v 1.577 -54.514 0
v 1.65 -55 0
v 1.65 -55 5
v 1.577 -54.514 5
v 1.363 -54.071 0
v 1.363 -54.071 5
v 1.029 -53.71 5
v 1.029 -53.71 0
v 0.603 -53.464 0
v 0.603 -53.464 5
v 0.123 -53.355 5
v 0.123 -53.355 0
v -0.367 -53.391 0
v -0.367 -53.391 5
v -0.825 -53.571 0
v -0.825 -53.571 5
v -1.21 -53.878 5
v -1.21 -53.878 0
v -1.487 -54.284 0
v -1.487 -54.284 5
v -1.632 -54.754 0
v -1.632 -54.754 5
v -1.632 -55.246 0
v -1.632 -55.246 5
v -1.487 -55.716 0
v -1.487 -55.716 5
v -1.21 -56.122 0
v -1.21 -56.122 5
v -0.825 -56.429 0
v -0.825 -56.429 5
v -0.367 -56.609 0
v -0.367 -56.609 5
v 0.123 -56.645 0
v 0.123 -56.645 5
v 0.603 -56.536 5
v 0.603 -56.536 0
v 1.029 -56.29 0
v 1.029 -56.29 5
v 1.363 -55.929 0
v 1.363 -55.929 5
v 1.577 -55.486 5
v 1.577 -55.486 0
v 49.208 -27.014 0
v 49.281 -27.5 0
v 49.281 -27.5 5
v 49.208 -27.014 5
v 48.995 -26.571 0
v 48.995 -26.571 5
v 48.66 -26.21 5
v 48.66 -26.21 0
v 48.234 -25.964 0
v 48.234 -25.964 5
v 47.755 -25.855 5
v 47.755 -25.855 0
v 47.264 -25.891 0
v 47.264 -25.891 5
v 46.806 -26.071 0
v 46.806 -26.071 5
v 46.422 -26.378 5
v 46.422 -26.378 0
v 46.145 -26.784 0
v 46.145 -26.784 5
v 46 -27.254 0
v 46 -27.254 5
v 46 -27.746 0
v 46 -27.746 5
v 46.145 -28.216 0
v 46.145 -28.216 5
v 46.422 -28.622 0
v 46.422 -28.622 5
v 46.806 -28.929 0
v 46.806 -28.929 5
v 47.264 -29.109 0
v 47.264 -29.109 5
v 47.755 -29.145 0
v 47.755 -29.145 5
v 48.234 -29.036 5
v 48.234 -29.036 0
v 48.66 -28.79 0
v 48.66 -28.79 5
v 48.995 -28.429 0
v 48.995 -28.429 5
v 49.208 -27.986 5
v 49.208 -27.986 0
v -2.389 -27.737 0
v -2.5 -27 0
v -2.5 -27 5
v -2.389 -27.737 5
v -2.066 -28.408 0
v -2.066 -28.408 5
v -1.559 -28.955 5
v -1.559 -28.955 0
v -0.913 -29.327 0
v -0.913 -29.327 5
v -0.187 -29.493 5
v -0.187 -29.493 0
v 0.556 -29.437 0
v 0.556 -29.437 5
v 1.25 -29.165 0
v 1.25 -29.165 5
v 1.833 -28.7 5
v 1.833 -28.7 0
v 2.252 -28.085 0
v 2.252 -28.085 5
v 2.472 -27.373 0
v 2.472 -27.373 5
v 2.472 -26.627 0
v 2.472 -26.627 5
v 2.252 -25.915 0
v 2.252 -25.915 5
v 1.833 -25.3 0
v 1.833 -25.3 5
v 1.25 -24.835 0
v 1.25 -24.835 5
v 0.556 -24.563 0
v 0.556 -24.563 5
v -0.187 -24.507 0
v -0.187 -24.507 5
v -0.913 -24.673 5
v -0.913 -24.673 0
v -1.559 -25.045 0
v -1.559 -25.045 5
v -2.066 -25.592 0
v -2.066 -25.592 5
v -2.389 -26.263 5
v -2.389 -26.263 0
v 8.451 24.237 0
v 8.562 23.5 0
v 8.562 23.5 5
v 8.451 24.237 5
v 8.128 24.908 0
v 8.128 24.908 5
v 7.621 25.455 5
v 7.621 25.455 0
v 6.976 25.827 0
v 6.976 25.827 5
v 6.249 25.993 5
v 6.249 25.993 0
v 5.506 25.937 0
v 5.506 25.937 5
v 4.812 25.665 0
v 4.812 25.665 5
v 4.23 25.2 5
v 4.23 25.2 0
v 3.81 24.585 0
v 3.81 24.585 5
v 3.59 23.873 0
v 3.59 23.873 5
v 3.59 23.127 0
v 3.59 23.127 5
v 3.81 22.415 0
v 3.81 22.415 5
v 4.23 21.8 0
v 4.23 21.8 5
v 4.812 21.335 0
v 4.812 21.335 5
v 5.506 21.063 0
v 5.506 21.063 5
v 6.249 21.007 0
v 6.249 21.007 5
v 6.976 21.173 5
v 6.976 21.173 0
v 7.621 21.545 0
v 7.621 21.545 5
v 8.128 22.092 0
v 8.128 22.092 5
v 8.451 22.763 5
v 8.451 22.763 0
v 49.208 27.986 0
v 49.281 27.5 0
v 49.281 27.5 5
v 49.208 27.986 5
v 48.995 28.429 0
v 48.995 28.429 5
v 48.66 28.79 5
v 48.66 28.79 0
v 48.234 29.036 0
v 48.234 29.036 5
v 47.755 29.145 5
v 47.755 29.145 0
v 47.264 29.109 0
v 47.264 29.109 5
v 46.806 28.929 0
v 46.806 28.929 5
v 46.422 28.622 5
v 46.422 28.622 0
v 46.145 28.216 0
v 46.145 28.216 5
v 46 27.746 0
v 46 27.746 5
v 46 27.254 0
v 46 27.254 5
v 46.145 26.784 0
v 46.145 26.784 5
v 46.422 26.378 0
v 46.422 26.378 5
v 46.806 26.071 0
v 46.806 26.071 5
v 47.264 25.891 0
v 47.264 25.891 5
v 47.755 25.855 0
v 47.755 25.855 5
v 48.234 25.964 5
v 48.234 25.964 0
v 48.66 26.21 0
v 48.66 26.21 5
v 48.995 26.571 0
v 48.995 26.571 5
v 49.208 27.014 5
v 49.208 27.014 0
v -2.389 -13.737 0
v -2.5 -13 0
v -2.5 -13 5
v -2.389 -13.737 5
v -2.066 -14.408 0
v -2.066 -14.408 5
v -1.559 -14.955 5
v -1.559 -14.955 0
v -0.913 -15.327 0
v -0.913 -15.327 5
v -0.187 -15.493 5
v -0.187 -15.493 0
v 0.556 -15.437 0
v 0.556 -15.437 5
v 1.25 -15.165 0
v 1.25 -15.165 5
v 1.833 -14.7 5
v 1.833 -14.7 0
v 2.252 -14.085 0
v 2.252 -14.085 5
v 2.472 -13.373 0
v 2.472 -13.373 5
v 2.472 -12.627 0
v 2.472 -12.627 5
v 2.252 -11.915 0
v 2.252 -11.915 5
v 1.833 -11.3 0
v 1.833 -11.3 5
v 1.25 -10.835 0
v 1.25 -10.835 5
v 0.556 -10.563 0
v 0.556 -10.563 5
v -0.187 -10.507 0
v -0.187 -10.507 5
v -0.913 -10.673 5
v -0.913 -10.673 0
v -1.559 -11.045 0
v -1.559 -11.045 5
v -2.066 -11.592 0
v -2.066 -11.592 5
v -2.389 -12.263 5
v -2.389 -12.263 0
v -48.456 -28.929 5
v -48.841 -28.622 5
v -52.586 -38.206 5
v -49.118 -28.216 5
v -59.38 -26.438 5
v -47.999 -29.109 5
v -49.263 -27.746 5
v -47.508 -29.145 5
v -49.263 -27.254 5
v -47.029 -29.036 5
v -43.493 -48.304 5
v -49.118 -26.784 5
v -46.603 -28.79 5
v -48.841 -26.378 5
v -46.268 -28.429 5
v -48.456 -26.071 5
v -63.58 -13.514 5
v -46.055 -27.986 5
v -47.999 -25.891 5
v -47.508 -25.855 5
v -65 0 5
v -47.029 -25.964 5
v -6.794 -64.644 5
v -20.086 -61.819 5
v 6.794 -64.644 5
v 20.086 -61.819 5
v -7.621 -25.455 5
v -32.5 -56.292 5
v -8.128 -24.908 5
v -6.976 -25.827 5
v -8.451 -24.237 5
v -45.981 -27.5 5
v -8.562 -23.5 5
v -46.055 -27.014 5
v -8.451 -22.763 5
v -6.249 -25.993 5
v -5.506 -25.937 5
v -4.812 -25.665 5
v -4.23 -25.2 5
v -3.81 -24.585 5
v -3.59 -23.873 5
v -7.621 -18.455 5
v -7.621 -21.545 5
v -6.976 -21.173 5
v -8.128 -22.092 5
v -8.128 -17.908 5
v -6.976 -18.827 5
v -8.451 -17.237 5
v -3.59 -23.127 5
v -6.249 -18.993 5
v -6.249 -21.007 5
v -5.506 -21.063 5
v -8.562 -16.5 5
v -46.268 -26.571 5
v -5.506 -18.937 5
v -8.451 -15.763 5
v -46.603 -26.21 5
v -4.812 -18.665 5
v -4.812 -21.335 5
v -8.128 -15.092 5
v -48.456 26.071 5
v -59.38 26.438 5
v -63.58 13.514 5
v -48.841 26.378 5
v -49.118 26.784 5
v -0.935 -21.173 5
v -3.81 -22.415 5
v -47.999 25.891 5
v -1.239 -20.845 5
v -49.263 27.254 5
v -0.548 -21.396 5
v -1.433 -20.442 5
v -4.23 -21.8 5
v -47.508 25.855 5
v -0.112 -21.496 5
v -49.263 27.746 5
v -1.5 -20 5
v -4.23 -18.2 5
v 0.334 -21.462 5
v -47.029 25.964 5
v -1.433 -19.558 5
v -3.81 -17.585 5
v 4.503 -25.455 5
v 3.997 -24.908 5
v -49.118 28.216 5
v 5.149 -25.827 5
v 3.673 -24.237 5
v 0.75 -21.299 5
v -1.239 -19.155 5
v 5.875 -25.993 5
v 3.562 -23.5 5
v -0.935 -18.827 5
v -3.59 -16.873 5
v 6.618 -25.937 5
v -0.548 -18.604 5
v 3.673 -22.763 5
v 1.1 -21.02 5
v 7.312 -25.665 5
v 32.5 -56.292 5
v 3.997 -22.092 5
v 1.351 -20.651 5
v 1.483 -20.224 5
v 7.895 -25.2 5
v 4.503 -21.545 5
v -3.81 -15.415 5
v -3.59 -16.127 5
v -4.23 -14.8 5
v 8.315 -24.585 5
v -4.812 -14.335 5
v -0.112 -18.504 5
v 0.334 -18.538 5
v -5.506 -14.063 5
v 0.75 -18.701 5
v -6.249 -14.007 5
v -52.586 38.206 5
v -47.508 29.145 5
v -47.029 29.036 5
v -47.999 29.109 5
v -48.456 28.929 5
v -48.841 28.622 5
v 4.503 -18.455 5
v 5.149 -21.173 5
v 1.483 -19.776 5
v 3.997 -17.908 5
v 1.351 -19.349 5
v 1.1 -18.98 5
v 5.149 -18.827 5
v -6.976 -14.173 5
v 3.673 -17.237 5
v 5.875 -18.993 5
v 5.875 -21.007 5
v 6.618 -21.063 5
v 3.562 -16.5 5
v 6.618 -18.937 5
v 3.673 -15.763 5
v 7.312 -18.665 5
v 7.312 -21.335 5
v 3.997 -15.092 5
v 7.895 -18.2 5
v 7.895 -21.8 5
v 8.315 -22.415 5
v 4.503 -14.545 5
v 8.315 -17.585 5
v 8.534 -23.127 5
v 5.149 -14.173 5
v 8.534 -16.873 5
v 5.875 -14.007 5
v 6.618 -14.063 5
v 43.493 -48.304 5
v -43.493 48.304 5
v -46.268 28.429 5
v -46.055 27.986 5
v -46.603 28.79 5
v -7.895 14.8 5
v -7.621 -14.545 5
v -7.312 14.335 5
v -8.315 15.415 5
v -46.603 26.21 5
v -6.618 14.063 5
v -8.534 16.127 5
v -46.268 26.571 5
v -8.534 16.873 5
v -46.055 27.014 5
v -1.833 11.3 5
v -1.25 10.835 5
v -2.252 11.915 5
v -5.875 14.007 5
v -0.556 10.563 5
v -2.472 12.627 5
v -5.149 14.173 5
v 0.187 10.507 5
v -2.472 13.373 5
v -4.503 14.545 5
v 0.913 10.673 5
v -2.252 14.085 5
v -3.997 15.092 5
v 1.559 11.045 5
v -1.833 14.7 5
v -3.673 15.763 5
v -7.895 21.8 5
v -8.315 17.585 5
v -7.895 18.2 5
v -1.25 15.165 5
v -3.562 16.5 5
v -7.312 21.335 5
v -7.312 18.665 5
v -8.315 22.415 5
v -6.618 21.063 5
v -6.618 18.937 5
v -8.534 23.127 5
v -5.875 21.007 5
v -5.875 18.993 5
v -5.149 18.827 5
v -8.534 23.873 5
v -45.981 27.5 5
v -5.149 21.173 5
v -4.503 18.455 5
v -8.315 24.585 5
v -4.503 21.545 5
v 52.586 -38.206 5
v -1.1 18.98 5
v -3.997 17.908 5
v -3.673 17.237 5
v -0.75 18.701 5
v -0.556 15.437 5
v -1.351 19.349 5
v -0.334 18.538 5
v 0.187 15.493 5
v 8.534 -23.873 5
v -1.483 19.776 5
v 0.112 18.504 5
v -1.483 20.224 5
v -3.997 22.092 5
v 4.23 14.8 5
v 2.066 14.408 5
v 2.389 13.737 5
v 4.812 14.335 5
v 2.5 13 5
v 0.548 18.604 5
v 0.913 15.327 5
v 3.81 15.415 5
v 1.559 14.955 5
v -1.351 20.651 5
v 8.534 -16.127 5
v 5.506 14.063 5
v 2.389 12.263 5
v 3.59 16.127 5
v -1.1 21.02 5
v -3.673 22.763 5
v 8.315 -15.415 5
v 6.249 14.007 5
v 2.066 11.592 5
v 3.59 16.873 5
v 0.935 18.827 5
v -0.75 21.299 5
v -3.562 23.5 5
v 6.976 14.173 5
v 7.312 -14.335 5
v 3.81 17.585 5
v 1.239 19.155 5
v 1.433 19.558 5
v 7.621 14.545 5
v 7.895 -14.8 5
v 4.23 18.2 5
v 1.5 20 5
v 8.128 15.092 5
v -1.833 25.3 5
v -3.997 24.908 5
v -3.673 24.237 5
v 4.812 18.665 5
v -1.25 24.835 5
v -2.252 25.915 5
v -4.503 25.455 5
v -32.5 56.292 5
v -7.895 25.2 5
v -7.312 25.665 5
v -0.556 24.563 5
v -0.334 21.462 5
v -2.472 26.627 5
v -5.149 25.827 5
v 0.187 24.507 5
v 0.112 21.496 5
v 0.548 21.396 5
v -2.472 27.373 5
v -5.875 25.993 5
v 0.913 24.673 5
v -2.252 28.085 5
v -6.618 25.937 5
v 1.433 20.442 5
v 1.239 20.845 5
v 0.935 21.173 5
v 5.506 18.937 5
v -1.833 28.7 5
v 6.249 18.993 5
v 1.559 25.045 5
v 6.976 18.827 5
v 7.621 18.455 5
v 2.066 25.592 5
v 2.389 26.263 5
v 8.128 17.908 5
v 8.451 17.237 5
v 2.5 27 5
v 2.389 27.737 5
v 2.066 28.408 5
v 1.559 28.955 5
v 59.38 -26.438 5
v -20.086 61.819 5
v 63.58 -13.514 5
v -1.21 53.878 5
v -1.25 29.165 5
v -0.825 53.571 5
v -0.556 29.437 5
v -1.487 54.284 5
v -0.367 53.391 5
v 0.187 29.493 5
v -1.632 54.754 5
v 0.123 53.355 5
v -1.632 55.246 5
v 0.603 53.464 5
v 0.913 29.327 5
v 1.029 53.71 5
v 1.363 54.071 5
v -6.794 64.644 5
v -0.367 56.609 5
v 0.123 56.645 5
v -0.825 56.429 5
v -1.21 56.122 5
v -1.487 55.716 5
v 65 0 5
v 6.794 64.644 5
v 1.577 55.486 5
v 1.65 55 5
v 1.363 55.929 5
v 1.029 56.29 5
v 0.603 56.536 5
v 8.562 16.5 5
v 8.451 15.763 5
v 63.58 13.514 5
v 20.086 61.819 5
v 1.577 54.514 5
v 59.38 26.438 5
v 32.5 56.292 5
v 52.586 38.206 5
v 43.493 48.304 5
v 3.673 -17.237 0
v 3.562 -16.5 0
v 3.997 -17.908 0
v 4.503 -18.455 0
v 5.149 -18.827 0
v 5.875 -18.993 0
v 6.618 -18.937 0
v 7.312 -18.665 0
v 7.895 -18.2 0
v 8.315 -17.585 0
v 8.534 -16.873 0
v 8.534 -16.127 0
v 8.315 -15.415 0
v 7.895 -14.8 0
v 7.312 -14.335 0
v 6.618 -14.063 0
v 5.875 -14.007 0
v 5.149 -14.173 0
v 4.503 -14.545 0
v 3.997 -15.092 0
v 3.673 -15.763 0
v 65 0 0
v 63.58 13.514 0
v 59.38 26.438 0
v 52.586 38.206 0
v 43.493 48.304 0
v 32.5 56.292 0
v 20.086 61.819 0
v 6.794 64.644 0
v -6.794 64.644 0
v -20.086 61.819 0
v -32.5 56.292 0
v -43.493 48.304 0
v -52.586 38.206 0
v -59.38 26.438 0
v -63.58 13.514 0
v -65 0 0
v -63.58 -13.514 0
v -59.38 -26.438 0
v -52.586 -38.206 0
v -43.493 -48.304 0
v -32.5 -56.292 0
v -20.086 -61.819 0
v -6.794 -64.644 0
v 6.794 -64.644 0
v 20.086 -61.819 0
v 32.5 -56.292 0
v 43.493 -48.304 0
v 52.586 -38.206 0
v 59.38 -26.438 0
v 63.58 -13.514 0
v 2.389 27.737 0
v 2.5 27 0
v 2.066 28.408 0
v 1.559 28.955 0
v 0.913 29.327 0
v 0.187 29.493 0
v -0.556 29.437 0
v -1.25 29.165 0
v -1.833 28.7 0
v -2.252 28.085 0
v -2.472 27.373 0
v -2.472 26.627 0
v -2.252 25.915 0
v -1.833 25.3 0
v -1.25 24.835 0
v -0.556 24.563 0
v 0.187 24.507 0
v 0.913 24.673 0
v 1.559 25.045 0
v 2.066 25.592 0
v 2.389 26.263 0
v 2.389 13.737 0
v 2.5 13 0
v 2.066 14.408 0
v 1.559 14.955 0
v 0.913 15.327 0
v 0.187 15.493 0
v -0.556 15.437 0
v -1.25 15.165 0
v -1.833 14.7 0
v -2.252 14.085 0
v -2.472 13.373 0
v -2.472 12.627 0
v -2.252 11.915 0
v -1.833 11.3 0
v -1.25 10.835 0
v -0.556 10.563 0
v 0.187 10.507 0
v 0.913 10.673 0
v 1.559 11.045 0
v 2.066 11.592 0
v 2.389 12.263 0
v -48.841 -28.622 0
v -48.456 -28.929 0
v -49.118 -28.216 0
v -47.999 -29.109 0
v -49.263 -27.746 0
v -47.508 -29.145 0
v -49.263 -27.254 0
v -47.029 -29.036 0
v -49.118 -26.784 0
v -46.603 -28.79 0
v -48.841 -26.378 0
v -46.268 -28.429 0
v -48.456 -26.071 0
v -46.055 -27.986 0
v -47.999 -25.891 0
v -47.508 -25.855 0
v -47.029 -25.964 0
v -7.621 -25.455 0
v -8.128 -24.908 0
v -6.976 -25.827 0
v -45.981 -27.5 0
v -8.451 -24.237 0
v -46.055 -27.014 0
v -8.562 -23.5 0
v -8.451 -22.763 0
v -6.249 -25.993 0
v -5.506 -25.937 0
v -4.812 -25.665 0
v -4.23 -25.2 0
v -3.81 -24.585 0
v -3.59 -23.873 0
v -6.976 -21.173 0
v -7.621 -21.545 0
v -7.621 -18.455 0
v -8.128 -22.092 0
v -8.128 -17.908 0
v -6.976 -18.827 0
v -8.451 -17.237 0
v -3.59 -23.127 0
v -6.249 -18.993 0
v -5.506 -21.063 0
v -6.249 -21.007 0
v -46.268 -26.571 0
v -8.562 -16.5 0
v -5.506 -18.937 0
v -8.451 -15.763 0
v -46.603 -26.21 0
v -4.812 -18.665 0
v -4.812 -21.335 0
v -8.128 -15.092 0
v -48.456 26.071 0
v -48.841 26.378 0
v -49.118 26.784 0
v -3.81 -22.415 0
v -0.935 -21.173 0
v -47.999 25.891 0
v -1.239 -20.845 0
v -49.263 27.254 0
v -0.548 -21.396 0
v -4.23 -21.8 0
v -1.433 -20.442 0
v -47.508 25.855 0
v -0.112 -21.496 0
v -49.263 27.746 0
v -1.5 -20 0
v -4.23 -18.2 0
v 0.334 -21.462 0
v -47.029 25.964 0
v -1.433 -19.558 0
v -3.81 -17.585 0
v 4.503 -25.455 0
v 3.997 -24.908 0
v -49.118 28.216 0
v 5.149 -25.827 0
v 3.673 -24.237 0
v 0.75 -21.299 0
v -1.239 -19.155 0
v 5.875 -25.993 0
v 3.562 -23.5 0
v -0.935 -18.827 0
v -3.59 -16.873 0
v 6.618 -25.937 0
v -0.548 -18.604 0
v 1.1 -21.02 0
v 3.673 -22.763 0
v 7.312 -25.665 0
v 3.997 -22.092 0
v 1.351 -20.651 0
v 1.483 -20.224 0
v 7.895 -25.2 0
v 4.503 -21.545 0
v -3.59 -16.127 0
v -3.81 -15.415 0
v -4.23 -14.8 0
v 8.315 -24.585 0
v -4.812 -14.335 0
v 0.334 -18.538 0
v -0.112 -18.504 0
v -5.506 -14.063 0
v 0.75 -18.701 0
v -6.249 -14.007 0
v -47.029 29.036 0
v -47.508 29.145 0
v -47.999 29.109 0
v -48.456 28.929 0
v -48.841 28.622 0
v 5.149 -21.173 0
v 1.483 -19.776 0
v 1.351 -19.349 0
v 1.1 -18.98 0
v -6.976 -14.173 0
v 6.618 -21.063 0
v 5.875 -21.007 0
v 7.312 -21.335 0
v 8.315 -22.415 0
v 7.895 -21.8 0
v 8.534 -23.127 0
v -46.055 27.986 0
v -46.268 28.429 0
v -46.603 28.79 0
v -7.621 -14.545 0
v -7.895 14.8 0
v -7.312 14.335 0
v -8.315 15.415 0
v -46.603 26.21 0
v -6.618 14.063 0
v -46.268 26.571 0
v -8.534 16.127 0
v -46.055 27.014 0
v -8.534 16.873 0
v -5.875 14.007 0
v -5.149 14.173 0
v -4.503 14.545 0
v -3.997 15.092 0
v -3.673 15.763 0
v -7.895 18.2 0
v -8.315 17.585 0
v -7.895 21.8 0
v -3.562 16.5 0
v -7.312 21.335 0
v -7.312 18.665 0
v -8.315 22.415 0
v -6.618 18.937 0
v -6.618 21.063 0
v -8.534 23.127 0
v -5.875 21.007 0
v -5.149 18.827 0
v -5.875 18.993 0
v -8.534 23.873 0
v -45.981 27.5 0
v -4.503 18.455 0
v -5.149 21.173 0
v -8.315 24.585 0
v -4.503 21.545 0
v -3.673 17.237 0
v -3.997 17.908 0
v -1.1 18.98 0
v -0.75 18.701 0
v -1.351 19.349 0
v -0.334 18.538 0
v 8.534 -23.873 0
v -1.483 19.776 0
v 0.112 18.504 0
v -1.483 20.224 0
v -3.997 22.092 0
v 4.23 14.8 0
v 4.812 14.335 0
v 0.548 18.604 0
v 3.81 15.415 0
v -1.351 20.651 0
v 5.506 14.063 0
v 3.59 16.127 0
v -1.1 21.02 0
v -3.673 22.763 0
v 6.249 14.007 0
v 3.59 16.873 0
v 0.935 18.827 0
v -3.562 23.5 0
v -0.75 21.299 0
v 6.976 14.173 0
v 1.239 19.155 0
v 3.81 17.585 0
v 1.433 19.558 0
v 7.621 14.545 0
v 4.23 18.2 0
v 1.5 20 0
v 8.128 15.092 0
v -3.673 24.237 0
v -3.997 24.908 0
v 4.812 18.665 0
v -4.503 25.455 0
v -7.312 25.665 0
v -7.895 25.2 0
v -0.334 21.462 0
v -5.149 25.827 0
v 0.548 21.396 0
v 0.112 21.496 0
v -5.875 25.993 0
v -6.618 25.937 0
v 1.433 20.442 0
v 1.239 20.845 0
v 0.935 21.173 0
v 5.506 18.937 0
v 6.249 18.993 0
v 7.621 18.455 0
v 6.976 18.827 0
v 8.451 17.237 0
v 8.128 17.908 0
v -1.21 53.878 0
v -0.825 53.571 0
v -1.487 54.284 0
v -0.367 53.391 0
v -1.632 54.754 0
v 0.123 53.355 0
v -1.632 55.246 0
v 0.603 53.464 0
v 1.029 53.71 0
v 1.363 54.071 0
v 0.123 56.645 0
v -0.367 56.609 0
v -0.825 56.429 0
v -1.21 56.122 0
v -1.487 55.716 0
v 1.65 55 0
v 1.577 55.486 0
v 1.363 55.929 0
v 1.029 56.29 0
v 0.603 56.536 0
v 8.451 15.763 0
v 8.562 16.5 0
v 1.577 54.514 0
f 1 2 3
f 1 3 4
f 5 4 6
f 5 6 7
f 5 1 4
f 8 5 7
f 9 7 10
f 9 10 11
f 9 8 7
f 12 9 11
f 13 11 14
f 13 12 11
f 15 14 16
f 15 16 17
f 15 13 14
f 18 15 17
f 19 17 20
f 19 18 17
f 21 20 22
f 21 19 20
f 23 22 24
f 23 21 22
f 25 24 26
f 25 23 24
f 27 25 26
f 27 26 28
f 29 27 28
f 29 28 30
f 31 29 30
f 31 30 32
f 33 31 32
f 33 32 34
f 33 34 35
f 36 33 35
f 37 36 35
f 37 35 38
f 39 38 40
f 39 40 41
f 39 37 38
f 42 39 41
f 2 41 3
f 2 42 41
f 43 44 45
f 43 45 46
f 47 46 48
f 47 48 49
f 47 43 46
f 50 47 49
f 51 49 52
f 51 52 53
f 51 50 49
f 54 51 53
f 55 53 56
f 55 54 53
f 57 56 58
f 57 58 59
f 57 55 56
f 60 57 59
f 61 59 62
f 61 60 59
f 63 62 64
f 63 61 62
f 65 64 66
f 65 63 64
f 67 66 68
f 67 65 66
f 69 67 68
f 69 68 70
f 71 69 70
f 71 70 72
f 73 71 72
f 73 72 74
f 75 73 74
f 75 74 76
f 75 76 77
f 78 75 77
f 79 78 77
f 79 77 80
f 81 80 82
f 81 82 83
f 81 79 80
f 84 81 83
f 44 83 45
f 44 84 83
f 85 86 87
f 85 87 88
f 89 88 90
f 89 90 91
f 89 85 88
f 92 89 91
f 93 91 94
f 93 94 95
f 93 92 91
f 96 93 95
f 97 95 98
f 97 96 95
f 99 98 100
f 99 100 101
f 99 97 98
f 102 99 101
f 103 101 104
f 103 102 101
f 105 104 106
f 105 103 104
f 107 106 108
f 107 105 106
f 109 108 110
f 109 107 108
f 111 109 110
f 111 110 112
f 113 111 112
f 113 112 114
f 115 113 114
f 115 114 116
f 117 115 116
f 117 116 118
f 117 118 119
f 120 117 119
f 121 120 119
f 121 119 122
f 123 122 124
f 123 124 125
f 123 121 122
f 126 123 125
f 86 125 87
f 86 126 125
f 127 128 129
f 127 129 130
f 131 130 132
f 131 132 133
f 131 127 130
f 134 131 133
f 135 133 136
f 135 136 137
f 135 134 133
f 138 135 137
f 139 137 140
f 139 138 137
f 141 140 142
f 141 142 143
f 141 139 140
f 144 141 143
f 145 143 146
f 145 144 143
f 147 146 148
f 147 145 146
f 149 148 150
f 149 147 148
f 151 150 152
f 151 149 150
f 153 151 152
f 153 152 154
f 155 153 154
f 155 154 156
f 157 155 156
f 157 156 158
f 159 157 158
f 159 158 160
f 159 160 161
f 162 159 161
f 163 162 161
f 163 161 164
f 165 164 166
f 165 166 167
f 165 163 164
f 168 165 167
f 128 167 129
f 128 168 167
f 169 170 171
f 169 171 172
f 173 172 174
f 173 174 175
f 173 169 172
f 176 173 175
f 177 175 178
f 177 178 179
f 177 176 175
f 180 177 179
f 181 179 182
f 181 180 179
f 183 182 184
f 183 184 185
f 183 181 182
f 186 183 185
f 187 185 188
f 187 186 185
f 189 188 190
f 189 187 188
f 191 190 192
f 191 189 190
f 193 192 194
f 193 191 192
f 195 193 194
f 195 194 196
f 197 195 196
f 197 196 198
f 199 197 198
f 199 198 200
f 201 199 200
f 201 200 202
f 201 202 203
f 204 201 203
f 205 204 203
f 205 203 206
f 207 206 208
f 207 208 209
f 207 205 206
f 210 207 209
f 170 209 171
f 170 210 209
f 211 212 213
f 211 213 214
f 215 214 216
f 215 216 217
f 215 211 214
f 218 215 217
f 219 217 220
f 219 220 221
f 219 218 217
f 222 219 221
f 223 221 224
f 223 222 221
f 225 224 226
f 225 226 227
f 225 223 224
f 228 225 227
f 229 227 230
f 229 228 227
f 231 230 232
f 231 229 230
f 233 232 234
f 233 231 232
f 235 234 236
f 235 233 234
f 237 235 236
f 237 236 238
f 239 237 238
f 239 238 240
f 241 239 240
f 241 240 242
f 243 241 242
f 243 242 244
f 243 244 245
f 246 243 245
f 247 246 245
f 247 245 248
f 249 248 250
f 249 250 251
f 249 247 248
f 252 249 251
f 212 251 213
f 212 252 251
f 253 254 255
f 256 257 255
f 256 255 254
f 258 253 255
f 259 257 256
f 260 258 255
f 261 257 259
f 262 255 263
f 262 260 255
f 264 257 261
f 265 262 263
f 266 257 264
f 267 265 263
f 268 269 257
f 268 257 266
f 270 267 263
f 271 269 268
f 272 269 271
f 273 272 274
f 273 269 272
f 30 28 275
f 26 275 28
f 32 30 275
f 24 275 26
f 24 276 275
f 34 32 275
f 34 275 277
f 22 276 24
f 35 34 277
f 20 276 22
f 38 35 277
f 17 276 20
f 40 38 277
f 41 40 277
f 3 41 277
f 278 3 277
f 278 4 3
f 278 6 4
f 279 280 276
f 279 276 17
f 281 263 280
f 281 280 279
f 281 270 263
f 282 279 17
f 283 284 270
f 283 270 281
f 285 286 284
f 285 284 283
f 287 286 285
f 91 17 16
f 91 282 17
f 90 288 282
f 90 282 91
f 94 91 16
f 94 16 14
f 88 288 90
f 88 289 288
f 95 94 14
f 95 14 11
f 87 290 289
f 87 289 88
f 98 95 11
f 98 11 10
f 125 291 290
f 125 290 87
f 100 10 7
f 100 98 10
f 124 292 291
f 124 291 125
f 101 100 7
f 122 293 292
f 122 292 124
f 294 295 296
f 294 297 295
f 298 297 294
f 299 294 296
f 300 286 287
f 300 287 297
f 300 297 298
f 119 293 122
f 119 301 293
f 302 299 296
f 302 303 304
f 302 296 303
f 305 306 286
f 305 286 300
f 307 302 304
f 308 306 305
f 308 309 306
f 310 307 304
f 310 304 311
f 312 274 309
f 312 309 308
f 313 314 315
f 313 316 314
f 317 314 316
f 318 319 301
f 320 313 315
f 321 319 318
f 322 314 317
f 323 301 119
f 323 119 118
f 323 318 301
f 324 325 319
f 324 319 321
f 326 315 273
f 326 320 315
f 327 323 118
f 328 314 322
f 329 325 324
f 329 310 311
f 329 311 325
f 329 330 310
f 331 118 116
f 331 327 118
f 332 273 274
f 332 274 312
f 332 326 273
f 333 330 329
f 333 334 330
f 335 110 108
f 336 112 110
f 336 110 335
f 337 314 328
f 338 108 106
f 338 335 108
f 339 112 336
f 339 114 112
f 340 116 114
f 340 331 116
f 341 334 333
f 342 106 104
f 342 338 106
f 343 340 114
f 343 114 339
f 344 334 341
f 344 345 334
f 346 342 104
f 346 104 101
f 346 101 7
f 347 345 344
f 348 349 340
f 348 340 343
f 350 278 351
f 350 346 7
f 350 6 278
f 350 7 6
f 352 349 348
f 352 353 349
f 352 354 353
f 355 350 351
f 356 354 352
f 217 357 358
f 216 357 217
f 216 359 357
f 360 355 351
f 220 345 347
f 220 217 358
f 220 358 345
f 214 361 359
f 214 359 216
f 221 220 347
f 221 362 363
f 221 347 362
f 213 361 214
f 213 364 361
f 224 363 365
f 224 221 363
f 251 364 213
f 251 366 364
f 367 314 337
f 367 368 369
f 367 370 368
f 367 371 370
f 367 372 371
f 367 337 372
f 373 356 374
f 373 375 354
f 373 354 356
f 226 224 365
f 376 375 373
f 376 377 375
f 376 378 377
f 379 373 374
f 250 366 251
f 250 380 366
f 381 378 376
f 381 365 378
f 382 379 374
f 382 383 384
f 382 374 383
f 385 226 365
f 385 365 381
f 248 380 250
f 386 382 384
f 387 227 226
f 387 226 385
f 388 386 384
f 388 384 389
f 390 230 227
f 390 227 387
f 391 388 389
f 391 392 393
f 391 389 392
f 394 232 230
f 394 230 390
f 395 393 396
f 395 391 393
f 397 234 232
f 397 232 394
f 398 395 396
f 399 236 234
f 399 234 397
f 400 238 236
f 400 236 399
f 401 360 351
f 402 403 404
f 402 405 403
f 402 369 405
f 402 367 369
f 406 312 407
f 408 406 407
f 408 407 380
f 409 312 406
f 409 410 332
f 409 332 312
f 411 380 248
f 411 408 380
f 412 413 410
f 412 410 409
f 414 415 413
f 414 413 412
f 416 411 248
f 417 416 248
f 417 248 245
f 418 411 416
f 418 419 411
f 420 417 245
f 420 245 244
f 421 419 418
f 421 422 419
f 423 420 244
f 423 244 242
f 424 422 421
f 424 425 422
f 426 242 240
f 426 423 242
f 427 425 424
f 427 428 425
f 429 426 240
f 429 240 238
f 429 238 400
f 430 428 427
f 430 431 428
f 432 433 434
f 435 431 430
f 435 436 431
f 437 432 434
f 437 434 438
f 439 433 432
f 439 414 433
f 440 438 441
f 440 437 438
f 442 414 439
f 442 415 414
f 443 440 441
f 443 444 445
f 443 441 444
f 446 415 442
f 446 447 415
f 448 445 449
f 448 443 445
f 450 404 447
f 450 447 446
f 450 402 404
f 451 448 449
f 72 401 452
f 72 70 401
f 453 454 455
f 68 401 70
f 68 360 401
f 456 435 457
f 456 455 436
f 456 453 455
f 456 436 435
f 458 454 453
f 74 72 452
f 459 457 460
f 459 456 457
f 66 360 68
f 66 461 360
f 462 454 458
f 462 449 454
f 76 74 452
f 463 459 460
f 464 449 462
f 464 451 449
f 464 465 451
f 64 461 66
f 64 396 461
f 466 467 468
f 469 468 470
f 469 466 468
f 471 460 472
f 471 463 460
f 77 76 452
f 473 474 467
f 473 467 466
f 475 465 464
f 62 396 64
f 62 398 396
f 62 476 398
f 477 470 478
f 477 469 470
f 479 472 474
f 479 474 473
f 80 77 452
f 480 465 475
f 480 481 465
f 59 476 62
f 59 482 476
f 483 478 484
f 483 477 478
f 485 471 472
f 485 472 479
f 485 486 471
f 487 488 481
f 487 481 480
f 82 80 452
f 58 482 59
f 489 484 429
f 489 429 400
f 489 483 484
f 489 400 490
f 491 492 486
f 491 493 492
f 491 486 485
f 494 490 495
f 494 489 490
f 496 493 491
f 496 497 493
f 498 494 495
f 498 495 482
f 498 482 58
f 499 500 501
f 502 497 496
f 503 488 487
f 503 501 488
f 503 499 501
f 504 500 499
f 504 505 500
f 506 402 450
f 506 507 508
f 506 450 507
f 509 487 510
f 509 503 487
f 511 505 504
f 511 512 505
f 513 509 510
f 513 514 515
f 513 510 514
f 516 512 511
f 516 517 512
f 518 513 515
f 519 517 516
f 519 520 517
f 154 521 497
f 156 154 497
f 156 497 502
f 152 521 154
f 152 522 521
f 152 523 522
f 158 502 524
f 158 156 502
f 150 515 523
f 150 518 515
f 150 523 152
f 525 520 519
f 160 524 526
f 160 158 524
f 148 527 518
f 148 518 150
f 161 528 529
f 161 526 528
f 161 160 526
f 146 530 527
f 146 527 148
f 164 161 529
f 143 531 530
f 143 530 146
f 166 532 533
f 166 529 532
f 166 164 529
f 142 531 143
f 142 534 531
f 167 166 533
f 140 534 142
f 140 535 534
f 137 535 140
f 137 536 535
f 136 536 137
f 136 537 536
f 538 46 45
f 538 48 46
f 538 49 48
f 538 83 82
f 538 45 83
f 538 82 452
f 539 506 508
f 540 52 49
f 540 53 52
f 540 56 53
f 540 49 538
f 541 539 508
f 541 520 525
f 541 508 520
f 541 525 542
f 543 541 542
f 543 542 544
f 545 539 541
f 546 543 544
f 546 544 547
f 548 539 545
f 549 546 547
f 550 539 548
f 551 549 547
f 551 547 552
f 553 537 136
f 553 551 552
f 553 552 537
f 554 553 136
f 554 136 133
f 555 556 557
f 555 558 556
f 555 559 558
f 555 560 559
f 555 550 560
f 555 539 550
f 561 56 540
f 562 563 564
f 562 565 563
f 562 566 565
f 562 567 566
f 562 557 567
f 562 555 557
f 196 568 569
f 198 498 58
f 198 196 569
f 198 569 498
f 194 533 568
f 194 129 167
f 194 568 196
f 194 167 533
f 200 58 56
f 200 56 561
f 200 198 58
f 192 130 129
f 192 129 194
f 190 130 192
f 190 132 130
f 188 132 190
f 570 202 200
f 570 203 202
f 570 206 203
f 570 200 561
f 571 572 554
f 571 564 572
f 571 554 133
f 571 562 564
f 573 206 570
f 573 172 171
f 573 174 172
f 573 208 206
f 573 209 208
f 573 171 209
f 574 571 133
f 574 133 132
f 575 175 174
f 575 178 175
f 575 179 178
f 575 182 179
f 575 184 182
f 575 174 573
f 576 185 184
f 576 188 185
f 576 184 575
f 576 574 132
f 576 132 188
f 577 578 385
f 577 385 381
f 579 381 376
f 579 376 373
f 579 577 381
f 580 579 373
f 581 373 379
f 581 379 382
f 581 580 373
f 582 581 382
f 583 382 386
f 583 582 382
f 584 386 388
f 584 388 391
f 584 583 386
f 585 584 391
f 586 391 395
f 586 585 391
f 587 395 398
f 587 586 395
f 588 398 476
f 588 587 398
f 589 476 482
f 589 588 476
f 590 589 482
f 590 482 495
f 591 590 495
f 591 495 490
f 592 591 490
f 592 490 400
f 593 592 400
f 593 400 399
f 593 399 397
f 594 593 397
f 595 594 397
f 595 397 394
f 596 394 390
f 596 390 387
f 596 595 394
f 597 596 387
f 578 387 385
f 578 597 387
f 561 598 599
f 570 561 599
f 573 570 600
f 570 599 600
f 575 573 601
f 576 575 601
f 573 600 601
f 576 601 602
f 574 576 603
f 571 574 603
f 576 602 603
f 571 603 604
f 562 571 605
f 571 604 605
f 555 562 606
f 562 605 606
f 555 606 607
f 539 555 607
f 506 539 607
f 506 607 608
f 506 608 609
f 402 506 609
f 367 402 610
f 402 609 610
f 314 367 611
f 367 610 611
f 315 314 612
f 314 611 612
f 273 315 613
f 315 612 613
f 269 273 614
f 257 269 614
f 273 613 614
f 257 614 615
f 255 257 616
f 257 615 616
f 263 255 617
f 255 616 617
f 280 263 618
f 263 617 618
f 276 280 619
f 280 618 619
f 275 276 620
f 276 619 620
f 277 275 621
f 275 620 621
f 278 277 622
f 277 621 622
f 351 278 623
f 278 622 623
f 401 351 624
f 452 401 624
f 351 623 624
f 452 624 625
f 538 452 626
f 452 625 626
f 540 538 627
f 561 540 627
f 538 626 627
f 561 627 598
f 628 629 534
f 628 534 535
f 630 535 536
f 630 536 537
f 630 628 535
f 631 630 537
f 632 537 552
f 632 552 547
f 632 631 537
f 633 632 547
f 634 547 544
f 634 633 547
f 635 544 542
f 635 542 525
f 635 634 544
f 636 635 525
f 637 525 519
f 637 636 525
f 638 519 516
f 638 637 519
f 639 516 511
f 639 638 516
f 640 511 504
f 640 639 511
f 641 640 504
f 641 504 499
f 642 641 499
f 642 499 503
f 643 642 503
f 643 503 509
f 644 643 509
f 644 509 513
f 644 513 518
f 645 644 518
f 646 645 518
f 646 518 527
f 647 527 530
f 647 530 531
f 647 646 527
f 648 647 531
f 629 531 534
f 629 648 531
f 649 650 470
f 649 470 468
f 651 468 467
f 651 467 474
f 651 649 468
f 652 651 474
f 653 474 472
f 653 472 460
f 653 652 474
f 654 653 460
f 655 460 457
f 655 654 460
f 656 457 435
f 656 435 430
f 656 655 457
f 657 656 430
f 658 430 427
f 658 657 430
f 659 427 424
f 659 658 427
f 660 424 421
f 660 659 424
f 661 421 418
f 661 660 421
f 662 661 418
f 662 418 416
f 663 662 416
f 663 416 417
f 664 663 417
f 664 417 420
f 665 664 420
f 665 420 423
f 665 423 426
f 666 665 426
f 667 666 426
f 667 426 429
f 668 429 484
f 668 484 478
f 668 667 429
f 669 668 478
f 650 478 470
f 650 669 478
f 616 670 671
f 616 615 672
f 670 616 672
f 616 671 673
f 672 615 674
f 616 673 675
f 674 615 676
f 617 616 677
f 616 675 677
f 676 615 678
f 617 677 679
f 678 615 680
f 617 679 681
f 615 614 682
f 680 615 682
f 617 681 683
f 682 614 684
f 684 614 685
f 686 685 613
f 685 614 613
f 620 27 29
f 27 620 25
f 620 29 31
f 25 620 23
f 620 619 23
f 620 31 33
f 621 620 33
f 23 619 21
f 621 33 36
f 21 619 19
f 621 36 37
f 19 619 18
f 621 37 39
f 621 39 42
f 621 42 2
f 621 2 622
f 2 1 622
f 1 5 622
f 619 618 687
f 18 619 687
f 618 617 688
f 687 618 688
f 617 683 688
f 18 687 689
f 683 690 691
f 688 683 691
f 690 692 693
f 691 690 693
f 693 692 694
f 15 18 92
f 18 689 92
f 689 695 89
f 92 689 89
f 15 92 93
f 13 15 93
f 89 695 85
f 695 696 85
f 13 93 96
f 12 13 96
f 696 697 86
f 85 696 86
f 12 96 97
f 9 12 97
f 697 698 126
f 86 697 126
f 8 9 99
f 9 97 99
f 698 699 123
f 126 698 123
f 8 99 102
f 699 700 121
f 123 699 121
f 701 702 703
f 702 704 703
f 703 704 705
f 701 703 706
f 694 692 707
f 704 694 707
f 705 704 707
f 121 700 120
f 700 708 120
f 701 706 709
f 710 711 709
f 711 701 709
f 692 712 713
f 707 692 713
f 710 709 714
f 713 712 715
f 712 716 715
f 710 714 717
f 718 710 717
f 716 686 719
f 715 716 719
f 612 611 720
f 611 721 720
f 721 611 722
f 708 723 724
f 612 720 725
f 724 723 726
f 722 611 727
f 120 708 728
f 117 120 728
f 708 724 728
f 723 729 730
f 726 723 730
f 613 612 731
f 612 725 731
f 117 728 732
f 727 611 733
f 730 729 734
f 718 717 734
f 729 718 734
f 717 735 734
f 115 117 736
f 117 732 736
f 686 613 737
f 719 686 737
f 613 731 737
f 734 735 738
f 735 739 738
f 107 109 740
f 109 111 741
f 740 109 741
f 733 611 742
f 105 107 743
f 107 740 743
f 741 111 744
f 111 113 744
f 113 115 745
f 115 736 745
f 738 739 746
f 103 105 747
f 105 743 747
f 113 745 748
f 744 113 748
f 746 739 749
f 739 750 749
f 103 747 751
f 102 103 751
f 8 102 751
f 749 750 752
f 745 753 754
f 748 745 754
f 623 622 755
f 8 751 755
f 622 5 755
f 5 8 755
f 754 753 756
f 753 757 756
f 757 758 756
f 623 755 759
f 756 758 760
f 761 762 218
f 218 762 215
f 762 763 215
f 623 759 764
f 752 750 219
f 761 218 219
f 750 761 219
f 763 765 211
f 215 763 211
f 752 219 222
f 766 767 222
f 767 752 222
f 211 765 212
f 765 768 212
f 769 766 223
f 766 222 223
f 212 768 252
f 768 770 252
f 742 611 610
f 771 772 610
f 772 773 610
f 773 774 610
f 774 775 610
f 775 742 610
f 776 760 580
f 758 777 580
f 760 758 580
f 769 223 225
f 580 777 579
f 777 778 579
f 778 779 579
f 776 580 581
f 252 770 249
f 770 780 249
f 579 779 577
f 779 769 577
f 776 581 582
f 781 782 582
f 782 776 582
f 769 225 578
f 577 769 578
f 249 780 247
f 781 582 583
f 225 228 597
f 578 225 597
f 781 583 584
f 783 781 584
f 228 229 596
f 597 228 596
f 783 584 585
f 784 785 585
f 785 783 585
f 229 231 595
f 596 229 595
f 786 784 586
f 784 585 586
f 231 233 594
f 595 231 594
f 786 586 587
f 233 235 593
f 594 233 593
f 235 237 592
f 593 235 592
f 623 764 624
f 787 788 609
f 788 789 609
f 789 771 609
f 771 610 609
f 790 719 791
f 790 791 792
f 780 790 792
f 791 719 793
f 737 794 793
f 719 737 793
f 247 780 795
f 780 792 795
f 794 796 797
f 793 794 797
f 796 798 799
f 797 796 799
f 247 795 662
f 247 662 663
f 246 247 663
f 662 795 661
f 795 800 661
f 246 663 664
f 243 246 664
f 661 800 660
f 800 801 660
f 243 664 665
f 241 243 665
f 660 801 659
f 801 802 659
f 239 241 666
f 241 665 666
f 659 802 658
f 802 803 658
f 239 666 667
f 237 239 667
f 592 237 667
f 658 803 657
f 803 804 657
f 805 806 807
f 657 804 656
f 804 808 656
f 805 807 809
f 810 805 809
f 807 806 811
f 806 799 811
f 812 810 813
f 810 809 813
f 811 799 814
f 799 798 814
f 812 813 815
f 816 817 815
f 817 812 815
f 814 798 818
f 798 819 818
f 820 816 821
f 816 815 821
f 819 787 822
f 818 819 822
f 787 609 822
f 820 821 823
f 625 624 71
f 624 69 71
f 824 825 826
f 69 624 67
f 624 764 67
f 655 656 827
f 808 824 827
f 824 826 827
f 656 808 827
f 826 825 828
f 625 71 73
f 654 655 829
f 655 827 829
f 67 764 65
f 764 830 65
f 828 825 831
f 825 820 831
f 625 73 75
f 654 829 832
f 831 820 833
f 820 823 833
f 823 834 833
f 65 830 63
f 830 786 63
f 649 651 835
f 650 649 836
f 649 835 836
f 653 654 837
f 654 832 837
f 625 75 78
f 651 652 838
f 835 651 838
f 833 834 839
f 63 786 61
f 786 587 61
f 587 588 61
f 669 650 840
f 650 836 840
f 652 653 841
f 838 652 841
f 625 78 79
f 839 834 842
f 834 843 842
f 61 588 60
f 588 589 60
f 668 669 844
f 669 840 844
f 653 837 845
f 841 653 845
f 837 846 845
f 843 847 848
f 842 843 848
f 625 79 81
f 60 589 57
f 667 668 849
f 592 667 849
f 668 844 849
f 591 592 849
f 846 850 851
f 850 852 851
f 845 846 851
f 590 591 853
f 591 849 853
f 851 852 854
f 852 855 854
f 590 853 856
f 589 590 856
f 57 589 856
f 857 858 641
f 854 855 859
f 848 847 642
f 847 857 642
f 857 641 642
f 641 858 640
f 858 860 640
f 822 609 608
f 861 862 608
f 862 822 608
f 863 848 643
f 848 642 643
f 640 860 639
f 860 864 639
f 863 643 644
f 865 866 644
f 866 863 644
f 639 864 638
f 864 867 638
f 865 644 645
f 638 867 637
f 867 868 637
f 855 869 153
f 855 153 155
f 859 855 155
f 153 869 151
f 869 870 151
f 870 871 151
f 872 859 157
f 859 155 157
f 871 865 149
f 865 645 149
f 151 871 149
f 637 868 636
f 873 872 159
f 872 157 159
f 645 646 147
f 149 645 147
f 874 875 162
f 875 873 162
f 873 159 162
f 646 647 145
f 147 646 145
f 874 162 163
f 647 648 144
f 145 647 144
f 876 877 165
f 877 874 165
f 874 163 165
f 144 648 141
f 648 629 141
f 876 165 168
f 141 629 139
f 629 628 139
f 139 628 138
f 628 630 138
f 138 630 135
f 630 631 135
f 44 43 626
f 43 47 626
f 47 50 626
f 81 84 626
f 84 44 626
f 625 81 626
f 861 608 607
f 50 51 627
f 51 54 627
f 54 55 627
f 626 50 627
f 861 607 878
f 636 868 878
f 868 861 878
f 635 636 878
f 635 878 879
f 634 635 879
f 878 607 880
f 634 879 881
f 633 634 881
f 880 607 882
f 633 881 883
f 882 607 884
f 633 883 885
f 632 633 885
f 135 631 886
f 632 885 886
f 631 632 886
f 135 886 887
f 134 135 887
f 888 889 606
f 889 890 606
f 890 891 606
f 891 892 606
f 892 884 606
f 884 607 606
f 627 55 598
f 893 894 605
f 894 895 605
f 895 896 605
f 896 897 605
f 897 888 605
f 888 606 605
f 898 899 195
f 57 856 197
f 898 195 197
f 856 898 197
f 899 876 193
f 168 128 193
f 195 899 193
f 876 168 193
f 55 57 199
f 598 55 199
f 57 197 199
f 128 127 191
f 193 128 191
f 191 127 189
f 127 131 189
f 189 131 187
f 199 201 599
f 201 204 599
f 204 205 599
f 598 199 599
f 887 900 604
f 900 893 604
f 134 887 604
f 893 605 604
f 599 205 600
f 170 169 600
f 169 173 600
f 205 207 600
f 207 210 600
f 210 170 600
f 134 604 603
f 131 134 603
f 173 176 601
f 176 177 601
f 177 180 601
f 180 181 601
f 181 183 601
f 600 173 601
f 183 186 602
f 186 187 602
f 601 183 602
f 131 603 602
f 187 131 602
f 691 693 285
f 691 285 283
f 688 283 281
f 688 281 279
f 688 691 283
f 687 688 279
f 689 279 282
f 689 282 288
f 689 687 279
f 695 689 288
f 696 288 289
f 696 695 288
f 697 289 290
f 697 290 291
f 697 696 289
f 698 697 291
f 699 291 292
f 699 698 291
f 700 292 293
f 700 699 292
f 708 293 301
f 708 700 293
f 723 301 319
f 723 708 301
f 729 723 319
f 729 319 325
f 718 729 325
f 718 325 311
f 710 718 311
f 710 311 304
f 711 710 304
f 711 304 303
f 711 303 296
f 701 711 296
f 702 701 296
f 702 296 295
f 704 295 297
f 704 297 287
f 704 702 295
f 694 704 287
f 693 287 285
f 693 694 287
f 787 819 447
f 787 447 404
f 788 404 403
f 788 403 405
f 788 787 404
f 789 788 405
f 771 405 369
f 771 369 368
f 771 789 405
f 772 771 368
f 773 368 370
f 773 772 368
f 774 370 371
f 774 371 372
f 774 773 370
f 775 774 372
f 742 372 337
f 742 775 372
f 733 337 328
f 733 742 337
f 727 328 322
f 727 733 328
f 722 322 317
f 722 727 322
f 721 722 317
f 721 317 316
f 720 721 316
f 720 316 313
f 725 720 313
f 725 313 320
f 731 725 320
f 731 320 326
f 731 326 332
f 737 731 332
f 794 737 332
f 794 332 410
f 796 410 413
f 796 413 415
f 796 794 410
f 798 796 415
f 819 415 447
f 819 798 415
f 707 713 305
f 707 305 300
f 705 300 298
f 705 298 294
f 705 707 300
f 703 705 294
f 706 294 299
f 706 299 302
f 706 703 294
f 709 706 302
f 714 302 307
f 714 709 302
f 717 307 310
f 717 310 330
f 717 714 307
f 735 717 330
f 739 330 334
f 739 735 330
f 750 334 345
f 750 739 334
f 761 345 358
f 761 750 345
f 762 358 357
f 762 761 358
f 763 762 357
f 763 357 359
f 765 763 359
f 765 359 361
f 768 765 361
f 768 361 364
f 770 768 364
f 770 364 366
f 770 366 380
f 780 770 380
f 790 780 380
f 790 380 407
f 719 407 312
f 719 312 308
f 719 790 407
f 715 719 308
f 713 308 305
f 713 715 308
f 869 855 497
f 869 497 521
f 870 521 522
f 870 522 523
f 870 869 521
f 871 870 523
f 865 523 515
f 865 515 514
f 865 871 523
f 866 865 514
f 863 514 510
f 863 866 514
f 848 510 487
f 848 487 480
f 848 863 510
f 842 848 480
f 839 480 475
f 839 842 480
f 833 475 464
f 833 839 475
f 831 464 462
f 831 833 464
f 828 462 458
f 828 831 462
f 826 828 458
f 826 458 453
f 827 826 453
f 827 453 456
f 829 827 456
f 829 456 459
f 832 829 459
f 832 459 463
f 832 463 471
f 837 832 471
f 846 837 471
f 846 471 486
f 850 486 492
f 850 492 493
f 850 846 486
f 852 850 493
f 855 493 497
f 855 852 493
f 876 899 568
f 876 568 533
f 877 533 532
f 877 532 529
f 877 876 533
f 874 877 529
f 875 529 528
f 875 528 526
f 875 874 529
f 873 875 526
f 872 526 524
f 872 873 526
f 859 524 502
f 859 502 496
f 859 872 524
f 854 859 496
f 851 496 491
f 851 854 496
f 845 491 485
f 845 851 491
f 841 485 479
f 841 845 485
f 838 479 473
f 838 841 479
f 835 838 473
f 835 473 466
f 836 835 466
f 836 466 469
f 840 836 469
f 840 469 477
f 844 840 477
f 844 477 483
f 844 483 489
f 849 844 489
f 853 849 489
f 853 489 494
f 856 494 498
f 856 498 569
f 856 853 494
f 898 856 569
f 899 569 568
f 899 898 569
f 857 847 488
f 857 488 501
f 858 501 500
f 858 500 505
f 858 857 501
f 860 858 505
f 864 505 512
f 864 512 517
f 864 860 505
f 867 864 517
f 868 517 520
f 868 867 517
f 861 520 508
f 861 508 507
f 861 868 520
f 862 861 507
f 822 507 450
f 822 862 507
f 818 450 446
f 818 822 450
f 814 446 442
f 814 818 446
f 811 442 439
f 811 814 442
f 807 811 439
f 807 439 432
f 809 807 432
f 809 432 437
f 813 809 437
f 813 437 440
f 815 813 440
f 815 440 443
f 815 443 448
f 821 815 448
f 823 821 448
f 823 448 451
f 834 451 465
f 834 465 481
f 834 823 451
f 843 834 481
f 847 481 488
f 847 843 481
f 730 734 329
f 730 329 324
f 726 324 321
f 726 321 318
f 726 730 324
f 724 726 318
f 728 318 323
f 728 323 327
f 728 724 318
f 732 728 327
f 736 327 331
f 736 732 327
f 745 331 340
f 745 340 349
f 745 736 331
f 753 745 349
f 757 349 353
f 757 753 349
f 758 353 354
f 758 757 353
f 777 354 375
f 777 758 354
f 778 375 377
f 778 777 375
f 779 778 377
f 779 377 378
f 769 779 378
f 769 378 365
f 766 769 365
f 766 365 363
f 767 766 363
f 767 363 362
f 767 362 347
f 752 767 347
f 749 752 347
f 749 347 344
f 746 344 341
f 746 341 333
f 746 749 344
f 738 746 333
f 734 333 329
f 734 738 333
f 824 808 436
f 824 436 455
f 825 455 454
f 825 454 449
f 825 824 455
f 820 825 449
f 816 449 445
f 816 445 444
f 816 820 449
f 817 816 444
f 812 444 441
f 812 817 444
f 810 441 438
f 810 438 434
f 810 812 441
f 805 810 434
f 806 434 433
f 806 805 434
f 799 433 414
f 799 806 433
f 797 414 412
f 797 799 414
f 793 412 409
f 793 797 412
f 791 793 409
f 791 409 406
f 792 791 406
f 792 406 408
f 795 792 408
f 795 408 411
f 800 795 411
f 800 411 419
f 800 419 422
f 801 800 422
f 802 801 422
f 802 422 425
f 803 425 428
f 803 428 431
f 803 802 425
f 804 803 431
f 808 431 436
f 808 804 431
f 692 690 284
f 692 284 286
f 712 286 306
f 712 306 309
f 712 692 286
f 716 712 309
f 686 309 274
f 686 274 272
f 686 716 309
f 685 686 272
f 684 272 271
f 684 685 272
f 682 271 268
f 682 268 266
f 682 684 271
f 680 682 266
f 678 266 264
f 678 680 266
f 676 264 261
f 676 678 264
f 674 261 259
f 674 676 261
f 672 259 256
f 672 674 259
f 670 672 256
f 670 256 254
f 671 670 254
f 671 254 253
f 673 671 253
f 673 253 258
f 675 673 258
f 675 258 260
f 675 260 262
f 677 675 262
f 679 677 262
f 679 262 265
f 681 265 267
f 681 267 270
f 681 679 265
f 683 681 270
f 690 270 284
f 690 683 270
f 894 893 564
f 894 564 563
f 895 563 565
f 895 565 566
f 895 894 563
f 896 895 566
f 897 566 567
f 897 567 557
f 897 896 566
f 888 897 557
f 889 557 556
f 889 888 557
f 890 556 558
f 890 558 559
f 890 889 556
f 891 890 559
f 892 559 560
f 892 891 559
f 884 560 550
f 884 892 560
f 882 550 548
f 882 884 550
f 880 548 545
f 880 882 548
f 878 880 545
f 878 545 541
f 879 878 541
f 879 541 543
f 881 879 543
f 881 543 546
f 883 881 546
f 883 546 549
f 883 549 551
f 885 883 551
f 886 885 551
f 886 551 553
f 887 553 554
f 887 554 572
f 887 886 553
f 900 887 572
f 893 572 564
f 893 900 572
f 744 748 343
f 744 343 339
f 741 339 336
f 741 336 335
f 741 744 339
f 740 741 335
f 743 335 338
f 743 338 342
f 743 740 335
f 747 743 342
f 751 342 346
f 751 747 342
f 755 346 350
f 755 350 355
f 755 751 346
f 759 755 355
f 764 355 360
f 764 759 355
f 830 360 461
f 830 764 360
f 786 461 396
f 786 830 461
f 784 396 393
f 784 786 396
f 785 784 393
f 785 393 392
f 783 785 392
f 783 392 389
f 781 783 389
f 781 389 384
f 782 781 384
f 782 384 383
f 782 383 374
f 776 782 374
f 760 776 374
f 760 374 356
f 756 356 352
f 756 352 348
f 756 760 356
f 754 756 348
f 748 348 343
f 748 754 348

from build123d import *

# Parameters (mm, degrees)
SKETCH1_R           = 65
SKETCH1_R_2         = 1.65
SKETCH1_R_3         = 2.5
SKETCH1_R_4         = 1.5
BOSS_EXTRUDE1_DEPTH = 5


with BuildPart() as part:
    # Sketch1 → Boss-Extrude1 (new body)
    with BuildSketch(Plane.XY):
        Circle(SKETCH1_R)
        with Locations((0, 55)):
            Circle(SKETCH1_R_2, mode=Mode.SUBTRACT)
        with Locations((47.631397208, 27.5)):
            Circle(SKETCH1_R_2, mode=Mode.SUBTRACT)
        with Locations((47.631397208, -27.5)):
            Circle(SKETCH1_R_2, mode=Mode.SUBTRACT)
        with Locations((0, -55)):
            Circle(SKETCH1_R_2, mode=Mode.SUBTRACT)
        with Locations((-47.631397208, -27.5)):
            Circle(SKETCH1_R_2, mode=Mode.SUBTRACT)
        with Locations((-47.631397208, 27.5)):
            Circle(SKETCH1_R_2, mode=Mode.SUBTRACT)
        with Locations((0, 27)):
            Circle(SKETCH1_R_3, mode=Mode.SUBTRACT)
        with Locations((6.062177826, 23.5)):
            Circle(SKETCH1_R_3, mode=Mode.SUBTRACT)
        with Locations((6.062177826, 16.5)):
            Circle(SKETCH1_R_3, mode=Mode.SUBTRACT)
        with Locations((0, 13)):
            Circle(SKETCH1_R_3, mode=Mode.SUBTRACT)
        with Locations((-6.062177826, 16.5)):
            Circle(SKETCH1_R_3, mode=Mode.SUBTRACT)
        with Locations((-6.062177826, 23.5)):
            Circle(SKETCH1_R_3, mode=Mode.SUBTRACT)
        with Locations((0, 20)):
            Circle(SKETCH1_R_4, mode=Mode.SUBTRACT)
        with Locations(Location((6.062177826, -16.5, 0), (0, 0, 180))):
            Circle(SKETCH1_R_3, mode=Mode.SUBTRACT)
        with Locations(Location((0, -13, 0), (0, 0, 180))):
            Circle(SKETCH1_R_3, mode=Mode.SUBTRACT)
        with Locations(Location((-6.062177826, -16.5, 0), (0, 0, 180))):
            Circle(SKETCH1_R_3, mode=Mode.SUBTRACT)
        with Locations(Location((0, -20, 0), (0, 0, 180))):
            Circle(SKETCH1_R_4, mode=Mode.SUBTRACT)
        with Locations(Location((-6.062177826, -23.5, 0), (0, 0, 180))):
            Circle(SKETCH1_R_3, mode=Mode.SUBTRACT)
        with Locations(Location((0, -27, 0), (0, 0, 180))):
            Circle(SKETCH1_R_3, mode=Mode.SUBTRACT)
        with Locations(Location((6.062177826, -23.5, 0), (0, 0, 180))):
            Circle(SKETCH1_R_3, mode=Mode.SUBTRACT)
    extrude(amount=BOSS_EXTRUDE1_DEPTH)


solid = part.part
